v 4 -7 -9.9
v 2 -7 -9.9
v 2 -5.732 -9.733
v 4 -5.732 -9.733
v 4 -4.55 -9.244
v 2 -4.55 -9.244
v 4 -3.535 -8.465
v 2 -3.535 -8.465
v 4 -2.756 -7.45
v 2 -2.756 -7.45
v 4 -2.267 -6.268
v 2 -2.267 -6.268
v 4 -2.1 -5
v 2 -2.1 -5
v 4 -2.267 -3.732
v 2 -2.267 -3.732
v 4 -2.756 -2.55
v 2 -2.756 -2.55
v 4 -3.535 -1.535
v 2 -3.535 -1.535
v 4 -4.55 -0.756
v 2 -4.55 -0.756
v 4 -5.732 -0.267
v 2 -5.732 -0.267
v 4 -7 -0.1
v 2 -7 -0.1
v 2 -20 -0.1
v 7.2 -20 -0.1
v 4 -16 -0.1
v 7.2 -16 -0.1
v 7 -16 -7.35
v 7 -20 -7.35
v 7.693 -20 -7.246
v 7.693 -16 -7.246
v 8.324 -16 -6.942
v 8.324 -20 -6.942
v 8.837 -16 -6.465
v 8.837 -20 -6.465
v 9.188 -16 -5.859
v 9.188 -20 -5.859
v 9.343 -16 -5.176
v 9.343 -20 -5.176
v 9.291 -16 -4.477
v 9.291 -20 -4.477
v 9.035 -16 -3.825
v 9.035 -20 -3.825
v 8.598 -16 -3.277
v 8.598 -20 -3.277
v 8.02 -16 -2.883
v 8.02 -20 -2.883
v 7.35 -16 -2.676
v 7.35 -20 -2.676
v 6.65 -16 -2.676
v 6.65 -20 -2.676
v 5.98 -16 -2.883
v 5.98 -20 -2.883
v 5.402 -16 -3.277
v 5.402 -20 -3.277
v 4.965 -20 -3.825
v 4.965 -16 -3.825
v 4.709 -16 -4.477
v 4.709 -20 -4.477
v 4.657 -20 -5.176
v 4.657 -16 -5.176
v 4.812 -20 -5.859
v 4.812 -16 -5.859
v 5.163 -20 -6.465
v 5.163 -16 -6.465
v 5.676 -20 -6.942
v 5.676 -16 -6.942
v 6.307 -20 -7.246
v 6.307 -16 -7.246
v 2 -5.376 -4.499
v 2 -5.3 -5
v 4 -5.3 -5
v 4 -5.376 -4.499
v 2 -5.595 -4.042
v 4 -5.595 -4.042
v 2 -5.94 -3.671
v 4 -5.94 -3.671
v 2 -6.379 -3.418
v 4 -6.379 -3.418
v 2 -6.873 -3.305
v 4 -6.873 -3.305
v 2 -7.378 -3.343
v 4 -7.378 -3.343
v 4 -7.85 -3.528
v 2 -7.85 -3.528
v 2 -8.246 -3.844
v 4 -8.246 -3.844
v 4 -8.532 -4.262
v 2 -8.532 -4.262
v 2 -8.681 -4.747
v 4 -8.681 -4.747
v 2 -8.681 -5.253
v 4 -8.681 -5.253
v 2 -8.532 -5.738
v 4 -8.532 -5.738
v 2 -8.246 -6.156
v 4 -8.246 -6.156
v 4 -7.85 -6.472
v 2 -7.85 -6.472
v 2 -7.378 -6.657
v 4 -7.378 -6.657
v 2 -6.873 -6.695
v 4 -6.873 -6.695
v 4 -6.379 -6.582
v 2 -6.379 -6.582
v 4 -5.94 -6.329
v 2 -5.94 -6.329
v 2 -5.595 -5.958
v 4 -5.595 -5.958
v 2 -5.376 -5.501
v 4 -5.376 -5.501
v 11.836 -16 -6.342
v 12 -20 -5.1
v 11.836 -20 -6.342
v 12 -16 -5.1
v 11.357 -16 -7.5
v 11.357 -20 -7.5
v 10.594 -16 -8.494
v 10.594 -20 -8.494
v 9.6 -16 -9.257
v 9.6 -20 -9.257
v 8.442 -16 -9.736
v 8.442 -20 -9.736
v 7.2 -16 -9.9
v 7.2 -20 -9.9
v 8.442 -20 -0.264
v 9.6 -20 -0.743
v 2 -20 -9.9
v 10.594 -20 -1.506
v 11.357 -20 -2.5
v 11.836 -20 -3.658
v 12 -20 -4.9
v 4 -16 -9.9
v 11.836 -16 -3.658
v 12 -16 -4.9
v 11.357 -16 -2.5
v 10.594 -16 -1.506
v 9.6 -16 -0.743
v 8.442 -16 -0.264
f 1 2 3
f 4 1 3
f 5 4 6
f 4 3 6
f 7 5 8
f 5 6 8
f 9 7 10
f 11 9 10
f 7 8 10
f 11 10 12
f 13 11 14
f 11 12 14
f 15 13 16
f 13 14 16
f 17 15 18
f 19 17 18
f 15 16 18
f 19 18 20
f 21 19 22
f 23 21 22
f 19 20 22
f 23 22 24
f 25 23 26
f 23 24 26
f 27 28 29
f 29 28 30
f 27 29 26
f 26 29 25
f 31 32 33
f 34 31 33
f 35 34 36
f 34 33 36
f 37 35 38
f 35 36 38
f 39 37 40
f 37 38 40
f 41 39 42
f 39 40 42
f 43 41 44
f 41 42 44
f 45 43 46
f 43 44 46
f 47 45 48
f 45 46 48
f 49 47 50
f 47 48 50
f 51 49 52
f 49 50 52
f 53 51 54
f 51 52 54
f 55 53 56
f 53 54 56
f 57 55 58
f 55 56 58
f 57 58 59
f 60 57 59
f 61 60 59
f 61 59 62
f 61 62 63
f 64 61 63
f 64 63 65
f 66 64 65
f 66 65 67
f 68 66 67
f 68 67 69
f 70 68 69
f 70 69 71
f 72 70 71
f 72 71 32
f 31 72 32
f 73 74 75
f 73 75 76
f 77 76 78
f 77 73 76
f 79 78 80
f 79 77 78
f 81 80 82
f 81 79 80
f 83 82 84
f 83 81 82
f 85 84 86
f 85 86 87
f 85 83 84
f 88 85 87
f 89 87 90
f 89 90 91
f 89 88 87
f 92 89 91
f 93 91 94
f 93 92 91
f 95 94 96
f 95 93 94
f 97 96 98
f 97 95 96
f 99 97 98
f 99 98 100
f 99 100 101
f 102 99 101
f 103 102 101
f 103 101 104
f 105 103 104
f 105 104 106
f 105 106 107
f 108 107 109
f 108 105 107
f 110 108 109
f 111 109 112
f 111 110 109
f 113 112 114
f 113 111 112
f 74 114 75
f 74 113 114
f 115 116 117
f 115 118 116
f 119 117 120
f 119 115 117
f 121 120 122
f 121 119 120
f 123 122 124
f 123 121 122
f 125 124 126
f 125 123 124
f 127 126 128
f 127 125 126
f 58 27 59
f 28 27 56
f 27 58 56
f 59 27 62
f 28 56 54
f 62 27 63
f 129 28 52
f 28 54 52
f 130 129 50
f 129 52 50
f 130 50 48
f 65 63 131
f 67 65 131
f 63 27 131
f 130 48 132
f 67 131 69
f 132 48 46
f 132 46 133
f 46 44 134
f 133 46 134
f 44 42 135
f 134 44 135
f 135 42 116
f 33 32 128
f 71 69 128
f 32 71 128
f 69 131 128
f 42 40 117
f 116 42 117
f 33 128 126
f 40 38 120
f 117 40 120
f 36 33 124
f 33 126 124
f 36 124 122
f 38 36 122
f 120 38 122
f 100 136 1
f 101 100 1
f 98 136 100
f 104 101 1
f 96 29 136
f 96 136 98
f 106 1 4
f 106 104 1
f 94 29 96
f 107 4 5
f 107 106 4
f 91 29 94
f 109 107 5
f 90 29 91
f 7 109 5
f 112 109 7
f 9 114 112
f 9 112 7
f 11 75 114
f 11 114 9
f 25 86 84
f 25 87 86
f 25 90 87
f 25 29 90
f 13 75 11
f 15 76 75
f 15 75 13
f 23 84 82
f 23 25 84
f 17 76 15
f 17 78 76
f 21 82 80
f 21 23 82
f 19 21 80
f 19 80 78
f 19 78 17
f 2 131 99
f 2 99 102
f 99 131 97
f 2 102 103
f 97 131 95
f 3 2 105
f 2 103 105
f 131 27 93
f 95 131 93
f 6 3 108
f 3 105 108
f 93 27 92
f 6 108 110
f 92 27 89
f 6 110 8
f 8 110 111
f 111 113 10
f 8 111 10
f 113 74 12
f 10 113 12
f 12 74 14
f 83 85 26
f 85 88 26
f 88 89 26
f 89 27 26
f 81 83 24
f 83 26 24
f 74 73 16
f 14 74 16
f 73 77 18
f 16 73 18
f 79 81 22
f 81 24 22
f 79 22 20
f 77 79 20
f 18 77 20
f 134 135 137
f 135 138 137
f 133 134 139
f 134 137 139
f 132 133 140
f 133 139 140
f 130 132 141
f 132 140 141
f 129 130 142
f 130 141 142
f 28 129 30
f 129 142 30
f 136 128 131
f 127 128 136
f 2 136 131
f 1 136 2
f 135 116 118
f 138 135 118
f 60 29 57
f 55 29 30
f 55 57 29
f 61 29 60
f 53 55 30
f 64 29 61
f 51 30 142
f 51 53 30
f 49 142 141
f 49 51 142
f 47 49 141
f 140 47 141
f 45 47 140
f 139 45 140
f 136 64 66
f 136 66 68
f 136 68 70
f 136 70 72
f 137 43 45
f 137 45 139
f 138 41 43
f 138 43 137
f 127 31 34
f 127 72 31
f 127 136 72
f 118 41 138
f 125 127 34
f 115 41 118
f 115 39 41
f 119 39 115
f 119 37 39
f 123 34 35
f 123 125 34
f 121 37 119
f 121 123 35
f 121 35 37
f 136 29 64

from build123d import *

# Parameters (mm, degrees)
SKETCH004_R     = 1.7
PAD002_DEPTH    = 2
SKETCH005_W     = 4
SKETCH005_H     = 8
PAD003_DEPTH    = 9.8
SKETCH006_R     = 2.35
POCKET001_DEPTH = 5
FILLET001_R     = 4.8


with BuildPart() as part:
    # Sketch004 (on DatumPlane) → Pad002 (new body)
    with BuildSketch(Plane.YZ.offset(2)):
        with BuildLine():
            ThreePointArc((-7, -9.9), (-2.1, -5), (-7, -0.1))
            Line((-7, -0.1), (-20, -0.1))
            Line((-20, -0.1), (-20, -9.9))
            Line((-20, -9.9), (-7, -9.9))
        make_face()
        with Locations((-7, -5)):
            Circle(SKETCH004_R, mode=Mode.SUBTRACT)
    extrude(amount=PAD002_DEPTH)

    # Sketch005 (on Face4 of Pad002) → Pad003 (join)
    with BuildSketch(Plane(origin=(2, 0, -9.9), x_dir=(0, 1, 0), z_dir=(0, 0, -1))):
        with Locations((-18, 6)):
            Rectangle(SKETCH005_W, SKETCH005_H)
    extrude(amount=-PAD003_DEPTH)

    # Sketch006 (on Face9 of Pad003) → Pocket001 (cut)
    with BuildSketch(Plane(origin=(2, -20, 0), x_dir=(0, 0, -1), z_dir=(0, -1, 0))):
        with Locations((5, 5)):
            Circle(SKETCH006_R)
    extrude(amount=-POCKET001_DEPTH, mode=Mode.SUBTRACT)

    # Fillet001
    fillet001_edges = [part.edges().sort_by_distance(p)[0] for p in [
        (12, -18, -0.1),
        (12, -18, -9.9),
    ]]
    fillet(fillet001_edges, radius=FILLET001_R)


solid = part.part
